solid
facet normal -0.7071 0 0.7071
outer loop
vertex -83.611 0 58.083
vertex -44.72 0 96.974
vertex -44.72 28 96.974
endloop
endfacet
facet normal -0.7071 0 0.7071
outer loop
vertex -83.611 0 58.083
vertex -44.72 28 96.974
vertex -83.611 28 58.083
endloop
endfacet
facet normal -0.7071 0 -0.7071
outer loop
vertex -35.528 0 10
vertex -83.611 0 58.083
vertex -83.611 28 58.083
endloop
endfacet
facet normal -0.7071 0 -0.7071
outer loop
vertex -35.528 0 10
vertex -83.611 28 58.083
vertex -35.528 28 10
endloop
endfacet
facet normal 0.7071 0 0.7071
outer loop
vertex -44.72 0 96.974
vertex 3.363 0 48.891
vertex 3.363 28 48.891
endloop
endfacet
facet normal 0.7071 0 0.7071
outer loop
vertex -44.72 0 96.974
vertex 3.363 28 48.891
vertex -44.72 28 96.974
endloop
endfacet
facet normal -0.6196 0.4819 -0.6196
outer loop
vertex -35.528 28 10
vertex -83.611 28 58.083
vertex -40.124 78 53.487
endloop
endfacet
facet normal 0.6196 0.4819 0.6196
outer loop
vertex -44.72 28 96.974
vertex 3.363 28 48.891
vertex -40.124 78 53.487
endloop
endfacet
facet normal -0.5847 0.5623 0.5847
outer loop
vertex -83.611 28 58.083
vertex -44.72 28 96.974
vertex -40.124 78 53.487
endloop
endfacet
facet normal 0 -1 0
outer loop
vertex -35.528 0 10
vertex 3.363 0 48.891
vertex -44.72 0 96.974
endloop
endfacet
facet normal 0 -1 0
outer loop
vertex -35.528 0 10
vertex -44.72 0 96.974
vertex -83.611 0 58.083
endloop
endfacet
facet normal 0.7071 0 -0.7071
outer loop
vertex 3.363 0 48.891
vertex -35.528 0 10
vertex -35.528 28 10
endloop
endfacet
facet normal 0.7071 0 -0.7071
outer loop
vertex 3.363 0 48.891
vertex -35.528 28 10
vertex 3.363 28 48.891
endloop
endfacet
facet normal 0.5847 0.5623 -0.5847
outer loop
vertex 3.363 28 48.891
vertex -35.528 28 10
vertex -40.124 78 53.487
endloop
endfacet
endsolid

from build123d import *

# Parameters (mm, degrees)
EXTRUDE1_DEPTH = 28


with BuildPart() as part:
    # Sketch1 → Extrude1 (new body)
    with BuildSketch(Plane(origin=(0, 0, 0), x_dir=(1, 0, 0), z_dir=(0, 1, 0))):
        Polygon((-35.527943991, -10), (3.362928975, -48.890872965), (-44.720332146, -96.974134086), (-83.611205111, -58.083261121), align=None)
    extrude(amount=EXTRUDE1_DEPTH)

    # Sketch2 → Loft1 section 0
    with BuildSketch(Plane(origin=(0, 28, 0), x_dir=(-1, 0, 0), z_dir=(0, 1, 0)), mode=Mode.PRIVATE) as loft1_s0:
        Polygon((35.527943991, 10), (-3.362928975, 48.890872965), (44.720332146, 96.974134086), (83.611205111, 58.083261121), align=None)
    loft([Vertex(-40.124138068, 78, 53.487067043), loft1_s0.sketch])


solid = part.part
